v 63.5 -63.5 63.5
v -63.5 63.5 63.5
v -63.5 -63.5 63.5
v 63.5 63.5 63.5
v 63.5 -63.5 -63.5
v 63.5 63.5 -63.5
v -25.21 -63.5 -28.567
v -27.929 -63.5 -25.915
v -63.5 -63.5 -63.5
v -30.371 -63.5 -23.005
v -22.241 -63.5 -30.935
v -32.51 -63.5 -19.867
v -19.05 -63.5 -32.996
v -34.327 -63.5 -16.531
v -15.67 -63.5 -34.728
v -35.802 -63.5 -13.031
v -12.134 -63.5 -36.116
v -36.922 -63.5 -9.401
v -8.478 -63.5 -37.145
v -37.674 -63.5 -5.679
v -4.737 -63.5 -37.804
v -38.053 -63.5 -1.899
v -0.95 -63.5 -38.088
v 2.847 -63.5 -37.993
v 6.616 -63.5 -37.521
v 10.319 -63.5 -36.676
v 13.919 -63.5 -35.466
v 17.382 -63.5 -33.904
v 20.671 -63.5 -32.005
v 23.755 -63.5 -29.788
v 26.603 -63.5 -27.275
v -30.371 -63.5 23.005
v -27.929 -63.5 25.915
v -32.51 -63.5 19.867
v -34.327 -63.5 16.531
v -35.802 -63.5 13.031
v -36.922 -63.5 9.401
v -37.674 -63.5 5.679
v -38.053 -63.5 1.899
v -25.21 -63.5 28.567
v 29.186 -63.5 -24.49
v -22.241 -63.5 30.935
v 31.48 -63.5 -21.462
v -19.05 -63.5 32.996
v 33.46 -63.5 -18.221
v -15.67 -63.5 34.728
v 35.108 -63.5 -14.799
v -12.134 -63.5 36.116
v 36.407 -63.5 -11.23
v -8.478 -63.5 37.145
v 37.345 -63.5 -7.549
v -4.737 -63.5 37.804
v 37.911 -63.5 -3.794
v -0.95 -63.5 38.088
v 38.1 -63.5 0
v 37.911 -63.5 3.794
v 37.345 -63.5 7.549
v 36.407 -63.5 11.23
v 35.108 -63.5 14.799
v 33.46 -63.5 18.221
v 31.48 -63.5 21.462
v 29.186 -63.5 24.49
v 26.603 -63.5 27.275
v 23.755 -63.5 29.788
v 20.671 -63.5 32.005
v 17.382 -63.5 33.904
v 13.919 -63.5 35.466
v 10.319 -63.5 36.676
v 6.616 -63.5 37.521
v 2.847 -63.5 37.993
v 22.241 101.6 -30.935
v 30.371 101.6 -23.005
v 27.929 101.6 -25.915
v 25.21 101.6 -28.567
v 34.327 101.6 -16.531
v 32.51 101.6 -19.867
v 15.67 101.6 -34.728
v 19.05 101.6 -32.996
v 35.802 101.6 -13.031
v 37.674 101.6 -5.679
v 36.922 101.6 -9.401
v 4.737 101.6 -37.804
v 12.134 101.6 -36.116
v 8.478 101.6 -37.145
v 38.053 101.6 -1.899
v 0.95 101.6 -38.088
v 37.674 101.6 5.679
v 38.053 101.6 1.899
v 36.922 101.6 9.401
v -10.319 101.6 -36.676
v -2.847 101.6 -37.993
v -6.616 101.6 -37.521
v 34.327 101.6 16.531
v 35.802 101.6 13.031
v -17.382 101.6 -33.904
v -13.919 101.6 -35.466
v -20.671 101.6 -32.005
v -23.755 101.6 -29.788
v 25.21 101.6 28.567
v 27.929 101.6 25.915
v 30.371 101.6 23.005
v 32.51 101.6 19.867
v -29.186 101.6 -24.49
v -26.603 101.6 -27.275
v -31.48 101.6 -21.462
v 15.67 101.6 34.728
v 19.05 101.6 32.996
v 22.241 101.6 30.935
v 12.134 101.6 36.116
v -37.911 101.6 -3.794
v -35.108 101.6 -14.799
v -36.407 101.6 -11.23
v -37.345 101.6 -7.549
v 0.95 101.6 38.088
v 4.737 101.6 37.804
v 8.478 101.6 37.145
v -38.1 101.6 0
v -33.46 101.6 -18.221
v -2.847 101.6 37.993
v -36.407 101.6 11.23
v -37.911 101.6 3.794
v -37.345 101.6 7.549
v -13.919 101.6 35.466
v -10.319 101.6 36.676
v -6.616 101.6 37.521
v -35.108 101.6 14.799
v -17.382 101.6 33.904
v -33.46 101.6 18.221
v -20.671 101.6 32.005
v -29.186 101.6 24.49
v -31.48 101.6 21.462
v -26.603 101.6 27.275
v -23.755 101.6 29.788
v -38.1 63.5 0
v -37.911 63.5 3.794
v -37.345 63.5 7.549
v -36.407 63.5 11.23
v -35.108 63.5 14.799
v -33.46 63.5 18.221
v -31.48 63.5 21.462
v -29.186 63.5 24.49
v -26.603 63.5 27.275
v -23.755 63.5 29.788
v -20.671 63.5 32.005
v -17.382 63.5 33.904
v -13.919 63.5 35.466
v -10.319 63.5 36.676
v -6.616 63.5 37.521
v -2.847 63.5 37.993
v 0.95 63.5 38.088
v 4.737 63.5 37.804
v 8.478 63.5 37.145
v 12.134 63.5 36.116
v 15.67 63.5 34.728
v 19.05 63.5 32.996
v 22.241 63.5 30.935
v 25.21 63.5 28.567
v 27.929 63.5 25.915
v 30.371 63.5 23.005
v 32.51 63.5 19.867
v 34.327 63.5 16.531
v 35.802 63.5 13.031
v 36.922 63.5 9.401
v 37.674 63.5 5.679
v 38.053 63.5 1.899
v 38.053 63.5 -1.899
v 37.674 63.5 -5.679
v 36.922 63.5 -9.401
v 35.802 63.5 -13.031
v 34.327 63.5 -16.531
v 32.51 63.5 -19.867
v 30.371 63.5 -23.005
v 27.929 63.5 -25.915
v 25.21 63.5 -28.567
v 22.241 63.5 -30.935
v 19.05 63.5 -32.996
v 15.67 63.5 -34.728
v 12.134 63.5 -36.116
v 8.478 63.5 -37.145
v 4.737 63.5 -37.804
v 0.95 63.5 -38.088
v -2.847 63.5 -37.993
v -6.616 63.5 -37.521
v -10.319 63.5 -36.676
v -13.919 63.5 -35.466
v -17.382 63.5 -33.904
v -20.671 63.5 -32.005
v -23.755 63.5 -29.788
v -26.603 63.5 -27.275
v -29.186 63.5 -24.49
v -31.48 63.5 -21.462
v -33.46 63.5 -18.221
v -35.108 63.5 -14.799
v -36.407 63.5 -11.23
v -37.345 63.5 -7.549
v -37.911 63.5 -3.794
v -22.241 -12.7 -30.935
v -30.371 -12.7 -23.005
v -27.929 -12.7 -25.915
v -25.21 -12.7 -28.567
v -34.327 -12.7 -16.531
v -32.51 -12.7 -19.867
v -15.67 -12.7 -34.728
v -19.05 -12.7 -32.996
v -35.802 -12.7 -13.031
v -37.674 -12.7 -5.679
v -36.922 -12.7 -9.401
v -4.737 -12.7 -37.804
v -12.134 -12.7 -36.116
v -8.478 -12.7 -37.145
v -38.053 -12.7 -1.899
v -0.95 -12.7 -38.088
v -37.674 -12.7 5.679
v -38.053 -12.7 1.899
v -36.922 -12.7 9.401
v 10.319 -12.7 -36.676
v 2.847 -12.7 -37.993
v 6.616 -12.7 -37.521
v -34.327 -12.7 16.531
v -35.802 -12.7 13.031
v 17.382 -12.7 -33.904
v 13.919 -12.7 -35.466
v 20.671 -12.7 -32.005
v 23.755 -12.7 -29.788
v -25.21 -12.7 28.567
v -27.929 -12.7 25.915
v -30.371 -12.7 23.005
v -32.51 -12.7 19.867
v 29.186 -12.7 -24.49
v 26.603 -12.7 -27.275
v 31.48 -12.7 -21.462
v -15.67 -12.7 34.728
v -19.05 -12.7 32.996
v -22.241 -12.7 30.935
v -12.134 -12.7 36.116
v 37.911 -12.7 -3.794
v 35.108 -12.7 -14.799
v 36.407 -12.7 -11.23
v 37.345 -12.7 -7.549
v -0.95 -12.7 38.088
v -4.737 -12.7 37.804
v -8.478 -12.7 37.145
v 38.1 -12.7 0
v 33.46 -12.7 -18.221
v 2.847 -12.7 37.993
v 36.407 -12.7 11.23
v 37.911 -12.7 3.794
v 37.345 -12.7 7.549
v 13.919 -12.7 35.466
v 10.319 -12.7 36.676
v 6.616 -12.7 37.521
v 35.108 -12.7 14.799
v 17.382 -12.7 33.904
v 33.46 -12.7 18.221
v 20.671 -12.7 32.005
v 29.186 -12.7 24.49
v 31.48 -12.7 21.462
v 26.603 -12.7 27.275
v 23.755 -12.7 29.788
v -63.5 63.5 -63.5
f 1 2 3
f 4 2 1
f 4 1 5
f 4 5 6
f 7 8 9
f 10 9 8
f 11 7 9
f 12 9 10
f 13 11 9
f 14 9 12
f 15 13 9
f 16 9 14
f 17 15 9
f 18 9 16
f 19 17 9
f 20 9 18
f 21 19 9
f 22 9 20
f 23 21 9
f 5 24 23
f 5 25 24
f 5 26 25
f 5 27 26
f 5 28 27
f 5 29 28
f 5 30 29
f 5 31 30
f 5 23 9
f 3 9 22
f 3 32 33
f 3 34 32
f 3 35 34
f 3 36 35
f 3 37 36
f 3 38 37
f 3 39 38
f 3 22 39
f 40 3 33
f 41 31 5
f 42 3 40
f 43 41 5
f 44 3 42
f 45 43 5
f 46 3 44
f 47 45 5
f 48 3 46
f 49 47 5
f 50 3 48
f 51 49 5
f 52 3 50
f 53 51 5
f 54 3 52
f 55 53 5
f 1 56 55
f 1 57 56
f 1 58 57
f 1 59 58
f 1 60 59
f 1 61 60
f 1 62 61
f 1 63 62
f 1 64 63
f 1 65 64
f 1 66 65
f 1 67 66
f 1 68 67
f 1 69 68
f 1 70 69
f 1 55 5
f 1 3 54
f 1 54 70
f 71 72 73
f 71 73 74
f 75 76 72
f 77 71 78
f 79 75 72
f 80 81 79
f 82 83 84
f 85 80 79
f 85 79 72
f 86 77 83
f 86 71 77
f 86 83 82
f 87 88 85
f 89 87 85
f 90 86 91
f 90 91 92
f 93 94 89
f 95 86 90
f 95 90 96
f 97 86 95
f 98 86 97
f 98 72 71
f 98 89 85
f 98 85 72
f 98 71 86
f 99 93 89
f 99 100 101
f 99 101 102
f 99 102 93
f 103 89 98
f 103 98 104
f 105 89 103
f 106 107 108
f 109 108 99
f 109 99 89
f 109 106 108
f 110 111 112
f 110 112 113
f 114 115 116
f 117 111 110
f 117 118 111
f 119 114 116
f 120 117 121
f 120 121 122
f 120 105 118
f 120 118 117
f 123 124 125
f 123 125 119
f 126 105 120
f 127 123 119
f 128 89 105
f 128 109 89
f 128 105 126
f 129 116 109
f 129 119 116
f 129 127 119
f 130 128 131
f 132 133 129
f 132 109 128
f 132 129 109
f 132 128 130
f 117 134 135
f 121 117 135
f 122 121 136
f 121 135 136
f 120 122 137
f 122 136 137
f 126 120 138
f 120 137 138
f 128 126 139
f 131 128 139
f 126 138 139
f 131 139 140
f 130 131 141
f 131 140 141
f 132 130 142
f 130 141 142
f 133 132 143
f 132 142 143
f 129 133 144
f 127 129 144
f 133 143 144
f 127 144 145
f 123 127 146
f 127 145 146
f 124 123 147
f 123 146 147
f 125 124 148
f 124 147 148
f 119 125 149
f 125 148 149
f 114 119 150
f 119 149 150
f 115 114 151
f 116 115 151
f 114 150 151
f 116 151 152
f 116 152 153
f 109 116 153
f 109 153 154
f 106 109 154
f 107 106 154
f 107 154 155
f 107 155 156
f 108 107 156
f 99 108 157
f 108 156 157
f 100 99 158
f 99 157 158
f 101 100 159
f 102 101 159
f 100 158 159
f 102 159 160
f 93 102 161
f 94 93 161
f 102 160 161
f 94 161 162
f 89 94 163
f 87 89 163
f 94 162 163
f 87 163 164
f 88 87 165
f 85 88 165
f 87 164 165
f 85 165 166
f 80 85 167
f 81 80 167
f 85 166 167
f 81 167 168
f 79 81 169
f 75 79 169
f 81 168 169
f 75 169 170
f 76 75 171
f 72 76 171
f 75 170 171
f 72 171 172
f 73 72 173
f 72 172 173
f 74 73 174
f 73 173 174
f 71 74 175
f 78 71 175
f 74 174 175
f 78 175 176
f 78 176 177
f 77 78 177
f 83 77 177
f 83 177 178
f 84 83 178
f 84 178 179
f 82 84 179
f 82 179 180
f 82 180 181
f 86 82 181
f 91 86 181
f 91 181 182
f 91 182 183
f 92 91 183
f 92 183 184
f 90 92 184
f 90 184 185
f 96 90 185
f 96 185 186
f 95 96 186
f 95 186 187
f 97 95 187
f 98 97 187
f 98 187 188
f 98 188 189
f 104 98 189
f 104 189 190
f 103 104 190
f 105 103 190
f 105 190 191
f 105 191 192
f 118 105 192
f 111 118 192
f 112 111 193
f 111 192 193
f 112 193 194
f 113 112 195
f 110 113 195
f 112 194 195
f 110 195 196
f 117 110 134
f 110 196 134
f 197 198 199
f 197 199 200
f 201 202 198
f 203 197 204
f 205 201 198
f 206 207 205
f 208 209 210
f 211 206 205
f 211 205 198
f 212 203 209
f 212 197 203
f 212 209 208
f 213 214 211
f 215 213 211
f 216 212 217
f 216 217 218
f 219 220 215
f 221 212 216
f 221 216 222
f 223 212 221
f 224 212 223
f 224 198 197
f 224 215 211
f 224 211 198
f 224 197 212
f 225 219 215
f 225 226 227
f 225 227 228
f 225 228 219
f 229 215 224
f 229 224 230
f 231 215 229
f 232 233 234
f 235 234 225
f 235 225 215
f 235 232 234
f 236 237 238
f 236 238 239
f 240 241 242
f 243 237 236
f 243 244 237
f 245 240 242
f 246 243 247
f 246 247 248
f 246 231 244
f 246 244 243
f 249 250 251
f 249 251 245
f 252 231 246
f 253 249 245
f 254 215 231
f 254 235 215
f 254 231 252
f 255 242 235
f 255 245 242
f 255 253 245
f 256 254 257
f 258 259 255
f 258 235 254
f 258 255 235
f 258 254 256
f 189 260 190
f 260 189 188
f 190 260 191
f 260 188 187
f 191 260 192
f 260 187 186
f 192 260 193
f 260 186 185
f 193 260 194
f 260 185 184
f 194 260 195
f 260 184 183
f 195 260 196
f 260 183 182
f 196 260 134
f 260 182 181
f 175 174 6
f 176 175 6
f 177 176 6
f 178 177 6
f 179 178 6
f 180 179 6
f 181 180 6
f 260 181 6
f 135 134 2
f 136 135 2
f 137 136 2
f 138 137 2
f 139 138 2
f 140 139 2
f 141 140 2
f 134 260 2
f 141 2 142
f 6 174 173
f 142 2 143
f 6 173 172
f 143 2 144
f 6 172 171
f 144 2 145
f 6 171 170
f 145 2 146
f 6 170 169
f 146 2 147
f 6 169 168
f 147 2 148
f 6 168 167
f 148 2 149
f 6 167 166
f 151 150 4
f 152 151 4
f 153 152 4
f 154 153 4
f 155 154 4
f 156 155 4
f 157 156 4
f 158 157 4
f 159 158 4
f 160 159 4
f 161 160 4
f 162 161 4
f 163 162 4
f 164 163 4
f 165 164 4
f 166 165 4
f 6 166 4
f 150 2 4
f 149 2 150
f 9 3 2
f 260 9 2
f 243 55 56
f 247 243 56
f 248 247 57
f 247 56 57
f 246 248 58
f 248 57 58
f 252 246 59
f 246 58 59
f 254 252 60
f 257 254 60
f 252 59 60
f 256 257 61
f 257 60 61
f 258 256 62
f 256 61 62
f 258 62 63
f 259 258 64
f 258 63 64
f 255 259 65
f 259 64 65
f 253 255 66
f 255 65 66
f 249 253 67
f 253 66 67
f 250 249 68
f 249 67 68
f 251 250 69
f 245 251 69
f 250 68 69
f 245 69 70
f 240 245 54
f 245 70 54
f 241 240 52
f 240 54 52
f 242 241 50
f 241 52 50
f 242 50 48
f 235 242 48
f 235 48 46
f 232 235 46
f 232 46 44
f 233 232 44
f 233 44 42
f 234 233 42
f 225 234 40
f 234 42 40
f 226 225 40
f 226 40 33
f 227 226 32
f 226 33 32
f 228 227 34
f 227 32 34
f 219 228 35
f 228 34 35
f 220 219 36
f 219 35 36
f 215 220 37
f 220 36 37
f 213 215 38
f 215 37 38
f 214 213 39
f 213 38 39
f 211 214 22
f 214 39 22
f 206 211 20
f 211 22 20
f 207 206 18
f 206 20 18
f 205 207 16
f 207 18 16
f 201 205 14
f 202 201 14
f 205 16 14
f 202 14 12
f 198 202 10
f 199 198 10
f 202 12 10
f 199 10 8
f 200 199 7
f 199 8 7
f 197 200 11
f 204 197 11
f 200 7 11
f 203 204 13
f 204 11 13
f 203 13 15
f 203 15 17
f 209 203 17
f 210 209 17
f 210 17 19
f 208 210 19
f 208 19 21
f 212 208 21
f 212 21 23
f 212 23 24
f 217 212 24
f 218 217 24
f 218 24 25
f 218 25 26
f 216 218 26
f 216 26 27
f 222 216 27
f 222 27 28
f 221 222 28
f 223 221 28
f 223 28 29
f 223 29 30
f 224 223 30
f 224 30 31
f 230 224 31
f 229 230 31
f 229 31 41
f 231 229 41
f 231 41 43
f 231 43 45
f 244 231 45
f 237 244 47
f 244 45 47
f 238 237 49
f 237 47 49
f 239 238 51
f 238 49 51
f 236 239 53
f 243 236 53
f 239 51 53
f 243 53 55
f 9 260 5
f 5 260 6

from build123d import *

# Parameters (mm, degrees)
F1_W     = 127
F1_H     = 127
F2_DEPTH = 63.5
F3_R     = 38.1
F4_DEPTH = 50.8
F5_R     = 38.1
F6_DEPTH = 38.1


# Not quite as in the source:
# - a variable given as a bare number and used for a length is read in inches; the dataset says mm whatever the document's units were


with BuildPart() as f2:
    # F1 (on Top) → F2 (new body, symmetric)
    with BuildSketch(Plane.XY):
        Rectangle(F1_W, F1_H)
    extrude(amount=F2_DEPTH, both=True)

    # F3 (on face) → F4 (cut)
    with BuildSketch(Plane.XZ.offset(63.5)):
        Circle(F3_R)
    extrude(amount=-F4_DEPTH, mode=Mode.SUBTRACT)

    # F5 (on face) → F6 (join)
    with BuildSketch(Plane(origin=(0, 63.5, 0), x_dir=(-1, 0, 0), z_dir=(0, 1, 0))):
        Circle(F5_R)
    extrude(amount=F6_DEPTH)


solid = f2.part
